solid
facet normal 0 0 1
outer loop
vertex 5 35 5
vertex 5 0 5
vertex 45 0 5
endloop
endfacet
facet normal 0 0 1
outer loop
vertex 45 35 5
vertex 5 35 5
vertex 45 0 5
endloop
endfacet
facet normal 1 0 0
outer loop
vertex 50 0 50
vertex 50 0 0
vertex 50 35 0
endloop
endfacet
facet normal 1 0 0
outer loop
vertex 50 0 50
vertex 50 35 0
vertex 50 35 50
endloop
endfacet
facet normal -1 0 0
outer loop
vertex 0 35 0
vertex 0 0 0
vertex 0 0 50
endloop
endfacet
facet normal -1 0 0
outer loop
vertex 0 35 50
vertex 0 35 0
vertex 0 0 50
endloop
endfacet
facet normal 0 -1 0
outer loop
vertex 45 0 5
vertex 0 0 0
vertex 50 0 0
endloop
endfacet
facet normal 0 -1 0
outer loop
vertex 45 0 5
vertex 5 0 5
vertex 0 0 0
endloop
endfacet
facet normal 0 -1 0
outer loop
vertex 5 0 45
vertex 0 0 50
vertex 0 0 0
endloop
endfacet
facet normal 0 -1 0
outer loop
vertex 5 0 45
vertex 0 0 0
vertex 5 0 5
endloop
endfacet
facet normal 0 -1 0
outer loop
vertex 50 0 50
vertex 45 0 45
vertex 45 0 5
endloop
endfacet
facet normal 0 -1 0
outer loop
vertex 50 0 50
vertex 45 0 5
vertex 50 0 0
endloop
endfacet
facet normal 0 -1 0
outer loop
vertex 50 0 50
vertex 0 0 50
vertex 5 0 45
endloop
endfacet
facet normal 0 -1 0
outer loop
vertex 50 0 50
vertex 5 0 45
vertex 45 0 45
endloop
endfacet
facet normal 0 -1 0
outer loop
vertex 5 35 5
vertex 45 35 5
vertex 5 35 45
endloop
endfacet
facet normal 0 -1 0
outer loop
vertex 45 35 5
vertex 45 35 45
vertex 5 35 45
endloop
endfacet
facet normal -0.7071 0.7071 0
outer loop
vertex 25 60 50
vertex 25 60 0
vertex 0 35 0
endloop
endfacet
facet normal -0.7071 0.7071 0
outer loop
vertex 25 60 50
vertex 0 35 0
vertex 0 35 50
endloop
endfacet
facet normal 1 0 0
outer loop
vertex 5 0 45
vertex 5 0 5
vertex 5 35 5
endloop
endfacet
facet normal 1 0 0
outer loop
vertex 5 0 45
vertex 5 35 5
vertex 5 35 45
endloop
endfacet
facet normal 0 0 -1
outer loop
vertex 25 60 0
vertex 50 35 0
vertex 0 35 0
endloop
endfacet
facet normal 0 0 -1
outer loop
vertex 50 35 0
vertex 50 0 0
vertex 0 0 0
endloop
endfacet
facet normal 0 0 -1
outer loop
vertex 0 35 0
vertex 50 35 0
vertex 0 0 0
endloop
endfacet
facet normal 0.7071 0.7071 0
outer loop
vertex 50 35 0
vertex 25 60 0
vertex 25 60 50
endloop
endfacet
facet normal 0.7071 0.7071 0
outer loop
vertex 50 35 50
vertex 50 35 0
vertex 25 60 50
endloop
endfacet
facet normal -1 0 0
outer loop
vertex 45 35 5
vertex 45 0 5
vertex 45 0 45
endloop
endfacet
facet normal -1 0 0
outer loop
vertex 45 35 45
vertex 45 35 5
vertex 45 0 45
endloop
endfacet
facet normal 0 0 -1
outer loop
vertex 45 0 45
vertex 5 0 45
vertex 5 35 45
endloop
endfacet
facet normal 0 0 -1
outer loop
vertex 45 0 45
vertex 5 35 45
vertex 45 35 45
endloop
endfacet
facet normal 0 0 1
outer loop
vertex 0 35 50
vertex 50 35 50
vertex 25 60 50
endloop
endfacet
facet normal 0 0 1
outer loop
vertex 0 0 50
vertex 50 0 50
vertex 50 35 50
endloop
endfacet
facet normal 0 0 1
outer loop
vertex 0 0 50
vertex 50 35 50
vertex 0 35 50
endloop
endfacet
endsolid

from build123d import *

# Parameters (mm, degrees)
F0_W     = 50
F0_H     = 50
F0_W_2   = 40
F0_H_2   = 40
F1_DEPTH = 35
F2_W     = 50
F2_H     = 50
F3_DEPTH = 25
F4_SIZE  = 24.99999


# Not quite as in the source:
# - a fillet or chamfer is up to 0.001 mm smaller than in the source, because OpenCascade refuses the exact size


with BuildPart() as f1:
    # F0 (on Front) → F1 (new body)
    with BuildSketch(Plane.XZ):
        with Locations((25, 25)):
            Rectangle(F0_W, F0_H)
        with Locations((25, 25)):
            Rectangle(F0_W_2, F0_H_2, mode=Mode.SUBTRACT)
    extrude(amount=-F1_DEPTH)

    # F2 (on face) → F3 (join)
    with BuildSketch(Plane(origin=(0, 35, 0), x_dir=(-1, 0, 0), z_dir=(0, 1, 0))):
        with Locations((-25, 25)):
            Rectangle(F2_W, F2_H)
    extrude(amount=F3_DEPTH)

    # F4 (size 25 in the source; OpenCascade refuses exactly that, so slightly less here)
    f4_edges = [f1.edges().sort_by_distance(p)[0] for p in [
        (0, 60, 25),
        (50, 60, 25),
    ]]
    chamfer(f4_edges, length=F4_SIZE)


solid = f1.part
